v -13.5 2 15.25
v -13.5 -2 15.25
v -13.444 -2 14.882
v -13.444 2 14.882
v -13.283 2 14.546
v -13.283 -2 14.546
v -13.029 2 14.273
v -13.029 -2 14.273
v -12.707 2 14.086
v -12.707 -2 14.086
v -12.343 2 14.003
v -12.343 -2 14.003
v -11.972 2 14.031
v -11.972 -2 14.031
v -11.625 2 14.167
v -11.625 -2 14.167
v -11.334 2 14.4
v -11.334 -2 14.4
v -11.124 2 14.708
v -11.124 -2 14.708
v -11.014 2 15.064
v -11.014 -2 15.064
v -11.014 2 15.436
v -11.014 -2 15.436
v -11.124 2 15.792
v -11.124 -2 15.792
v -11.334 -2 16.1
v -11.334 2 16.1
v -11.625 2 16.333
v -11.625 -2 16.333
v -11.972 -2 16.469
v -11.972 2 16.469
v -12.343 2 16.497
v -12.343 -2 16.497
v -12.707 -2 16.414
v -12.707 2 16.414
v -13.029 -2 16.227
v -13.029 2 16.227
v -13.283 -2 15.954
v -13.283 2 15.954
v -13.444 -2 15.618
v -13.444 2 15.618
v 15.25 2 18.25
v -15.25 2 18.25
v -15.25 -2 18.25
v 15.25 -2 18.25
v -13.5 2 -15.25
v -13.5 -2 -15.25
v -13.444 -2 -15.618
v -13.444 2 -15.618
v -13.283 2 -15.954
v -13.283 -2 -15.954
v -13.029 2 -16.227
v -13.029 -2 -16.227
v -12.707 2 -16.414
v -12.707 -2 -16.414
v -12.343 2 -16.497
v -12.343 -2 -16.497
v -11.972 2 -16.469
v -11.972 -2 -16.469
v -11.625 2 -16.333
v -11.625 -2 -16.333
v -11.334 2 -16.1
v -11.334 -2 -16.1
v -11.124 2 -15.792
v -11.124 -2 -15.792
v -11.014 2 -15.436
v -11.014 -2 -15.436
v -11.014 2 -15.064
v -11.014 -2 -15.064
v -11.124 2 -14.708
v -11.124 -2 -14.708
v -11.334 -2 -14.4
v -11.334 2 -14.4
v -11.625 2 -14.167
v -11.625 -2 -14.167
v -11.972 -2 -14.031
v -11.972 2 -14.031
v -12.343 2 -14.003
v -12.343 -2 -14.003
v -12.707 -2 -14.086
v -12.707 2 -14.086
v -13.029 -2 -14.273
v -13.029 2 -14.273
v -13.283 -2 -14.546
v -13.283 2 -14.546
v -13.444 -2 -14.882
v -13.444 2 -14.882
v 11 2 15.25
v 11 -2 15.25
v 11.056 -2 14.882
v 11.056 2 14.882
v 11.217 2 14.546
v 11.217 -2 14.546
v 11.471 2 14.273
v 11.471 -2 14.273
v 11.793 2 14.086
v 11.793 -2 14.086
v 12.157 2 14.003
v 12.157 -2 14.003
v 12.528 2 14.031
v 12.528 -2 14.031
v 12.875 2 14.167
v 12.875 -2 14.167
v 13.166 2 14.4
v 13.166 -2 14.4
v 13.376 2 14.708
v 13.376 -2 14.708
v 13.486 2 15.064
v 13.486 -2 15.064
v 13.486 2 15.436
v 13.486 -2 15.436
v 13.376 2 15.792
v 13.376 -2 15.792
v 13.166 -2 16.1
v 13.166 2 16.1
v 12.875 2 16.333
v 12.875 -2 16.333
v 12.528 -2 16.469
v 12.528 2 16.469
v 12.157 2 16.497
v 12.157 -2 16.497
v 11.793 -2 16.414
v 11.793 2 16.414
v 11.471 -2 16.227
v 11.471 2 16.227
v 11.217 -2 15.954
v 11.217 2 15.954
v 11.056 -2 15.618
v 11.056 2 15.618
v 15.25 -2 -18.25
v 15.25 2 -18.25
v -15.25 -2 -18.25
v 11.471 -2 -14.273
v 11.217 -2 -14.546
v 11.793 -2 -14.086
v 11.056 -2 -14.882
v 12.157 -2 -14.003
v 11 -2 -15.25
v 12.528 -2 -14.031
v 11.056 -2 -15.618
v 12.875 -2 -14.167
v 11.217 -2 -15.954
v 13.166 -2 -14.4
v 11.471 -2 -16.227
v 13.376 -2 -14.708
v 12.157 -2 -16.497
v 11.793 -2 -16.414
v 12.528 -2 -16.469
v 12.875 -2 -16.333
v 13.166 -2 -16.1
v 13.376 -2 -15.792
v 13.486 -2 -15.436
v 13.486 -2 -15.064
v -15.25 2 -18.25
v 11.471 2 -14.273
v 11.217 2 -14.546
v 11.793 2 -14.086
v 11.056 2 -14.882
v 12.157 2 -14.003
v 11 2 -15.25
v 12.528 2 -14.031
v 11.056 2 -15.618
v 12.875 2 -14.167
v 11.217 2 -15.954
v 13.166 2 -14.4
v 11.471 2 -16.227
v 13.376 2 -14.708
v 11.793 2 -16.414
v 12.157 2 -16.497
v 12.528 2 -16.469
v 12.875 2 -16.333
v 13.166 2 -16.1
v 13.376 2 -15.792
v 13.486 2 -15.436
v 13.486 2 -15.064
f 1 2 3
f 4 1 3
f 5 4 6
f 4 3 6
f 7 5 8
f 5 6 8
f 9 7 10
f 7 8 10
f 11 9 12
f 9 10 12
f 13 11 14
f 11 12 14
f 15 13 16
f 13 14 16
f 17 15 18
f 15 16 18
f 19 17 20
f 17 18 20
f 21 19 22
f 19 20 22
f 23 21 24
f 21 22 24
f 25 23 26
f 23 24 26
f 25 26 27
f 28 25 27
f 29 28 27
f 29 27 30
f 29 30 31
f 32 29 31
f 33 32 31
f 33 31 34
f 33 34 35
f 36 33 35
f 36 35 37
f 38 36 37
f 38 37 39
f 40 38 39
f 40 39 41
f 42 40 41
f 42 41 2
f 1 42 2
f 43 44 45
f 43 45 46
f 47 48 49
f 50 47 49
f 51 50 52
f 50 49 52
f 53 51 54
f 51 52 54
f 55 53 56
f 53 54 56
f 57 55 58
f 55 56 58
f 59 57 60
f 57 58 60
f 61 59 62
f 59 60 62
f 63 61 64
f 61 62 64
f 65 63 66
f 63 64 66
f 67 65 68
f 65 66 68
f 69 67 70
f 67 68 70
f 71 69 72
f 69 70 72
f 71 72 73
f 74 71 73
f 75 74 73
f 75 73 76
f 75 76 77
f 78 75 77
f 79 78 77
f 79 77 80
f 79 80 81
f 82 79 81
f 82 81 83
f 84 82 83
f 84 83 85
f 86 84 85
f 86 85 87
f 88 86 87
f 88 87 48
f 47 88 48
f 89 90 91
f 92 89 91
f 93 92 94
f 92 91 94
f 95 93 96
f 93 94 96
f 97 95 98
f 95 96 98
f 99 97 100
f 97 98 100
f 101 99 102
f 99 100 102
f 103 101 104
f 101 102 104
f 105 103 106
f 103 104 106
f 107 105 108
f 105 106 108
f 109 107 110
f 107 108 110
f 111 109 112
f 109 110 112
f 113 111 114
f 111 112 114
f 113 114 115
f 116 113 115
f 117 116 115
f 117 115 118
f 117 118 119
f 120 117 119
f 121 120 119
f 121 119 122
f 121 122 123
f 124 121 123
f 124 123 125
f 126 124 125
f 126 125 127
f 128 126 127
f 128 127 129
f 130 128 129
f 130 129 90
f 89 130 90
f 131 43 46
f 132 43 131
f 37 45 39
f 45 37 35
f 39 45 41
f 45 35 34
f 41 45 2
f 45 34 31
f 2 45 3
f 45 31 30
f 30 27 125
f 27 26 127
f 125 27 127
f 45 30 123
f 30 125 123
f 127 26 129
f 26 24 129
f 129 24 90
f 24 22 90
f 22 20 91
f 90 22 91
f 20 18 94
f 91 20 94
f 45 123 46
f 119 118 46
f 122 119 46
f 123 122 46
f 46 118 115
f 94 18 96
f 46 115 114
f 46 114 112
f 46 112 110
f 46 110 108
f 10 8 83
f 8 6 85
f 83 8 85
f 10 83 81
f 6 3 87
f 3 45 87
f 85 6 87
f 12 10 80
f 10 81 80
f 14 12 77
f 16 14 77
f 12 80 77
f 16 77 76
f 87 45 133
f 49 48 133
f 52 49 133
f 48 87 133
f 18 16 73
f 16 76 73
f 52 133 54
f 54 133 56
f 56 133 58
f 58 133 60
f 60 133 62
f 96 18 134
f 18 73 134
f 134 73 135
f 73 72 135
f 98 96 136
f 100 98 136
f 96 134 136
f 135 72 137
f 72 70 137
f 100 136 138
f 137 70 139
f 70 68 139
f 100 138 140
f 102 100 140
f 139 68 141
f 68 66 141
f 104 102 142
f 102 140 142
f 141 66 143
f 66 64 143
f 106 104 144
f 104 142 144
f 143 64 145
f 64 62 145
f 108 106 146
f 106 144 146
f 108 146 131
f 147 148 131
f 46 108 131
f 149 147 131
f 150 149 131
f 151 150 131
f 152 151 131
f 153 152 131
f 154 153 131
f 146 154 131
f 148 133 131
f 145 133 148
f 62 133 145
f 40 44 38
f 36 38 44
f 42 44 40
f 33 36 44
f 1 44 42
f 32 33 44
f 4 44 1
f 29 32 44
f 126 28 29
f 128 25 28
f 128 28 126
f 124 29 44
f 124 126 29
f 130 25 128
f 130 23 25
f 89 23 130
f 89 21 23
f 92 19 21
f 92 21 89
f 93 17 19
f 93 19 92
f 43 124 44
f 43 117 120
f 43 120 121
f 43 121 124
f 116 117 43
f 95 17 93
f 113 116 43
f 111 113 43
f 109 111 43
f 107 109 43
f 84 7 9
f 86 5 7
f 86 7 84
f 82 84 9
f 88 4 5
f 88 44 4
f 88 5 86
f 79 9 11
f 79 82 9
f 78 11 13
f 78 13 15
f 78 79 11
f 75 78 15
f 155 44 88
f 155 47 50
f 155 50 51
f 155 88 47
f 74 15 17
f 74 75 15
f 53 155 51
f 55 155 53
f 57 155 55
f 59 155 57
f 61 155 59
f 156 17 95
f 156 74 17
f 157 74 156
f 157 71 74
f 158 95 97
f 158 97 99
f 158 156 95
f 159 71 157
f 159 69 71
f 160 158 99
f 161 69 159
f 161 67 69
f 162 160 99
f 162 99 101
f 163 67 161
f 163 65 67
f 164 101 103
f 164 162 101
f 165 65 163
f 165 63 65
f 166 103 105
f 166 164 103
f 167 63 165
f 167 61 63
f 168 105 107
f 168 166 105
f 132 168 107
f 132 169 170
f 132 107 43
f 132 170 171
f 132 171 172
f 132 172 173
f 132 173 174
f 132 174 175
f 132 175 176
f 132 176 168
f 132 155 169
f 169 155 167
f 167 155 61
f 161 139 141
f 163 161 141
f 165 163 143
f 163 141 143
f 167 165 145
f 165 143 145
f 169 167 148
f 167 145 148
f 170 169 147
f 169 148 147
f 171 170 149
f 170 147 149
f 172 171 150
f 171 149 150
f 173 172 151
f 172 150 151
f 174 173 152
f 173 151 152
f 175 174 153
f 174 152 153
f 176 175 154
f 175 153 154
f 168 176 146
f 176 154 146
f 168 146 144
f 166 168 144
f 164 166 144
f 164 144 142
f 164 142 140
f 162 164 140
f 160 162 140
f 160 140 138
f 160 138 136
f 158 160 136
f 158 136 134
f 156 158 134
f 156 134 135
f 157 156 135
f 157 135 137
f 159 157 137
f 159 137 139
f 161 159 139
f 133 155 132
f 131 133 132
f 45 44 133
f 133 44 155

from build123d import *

# Parameters (mm, degrees)
SKETCH1_W             = 24.5
SKETCH1_H             = 24.5
BOSS_EXTRUDE1_DEPTH   = 2
SKETCH2_W             = 30.5
SKETCH2_H             = 36.5
SKETCH2_W_2           = 24.5
SKETCH2_H_2           = 24.5
BOSS_EXTRUDE2_DEPTH   = 4
M3X0_5_TAPPED_HOLE1_D = 2.5


with BuildPart() as part:
    # Sketch1 → Boss-Extrude1 (new body, symmetric)
    with BuildSketch(Plane(origin=(0, 0, 0), x_dir=(1, 0, 0), z_dir=(0, 1, 0))):
        Rectangle(SKETCH1_W, SKETCH1_H)
    extrude(amount=BOSS_EXTRUDE1_DEPTH, both=True)

    # Sketch2 → Boss-Extrude2 (add)
    with BuildSketch(Plane(origin=(0, 2, 0), x_dir=(1, 0, 0), z_dir=(0, 1, 0))):
        Rectangle(SKETCH2_W, SKETCH2_H)
        Rectangle(SKETCH2_W_2, SKETCH2_H_2, mode=Mode.SUBTRACT)
    extrude(amount=-BOSS_EXTRUDE2_DEPTH)

    # M3x0.5 Tapped Hole1 (through all)
    with Locations(Plane(origin=(0, 2, 0), x_dir=(1, 0, 0), z_dir=(0, 1, 0))):
        with Locations((-12.25, 15.25), (12.25, 15.25), (-12.25, -15.25), (12.25, -15.25)):
            Hole(M3X0_5_TAPPED_HOLE1_D / 2)


solid = part.part
